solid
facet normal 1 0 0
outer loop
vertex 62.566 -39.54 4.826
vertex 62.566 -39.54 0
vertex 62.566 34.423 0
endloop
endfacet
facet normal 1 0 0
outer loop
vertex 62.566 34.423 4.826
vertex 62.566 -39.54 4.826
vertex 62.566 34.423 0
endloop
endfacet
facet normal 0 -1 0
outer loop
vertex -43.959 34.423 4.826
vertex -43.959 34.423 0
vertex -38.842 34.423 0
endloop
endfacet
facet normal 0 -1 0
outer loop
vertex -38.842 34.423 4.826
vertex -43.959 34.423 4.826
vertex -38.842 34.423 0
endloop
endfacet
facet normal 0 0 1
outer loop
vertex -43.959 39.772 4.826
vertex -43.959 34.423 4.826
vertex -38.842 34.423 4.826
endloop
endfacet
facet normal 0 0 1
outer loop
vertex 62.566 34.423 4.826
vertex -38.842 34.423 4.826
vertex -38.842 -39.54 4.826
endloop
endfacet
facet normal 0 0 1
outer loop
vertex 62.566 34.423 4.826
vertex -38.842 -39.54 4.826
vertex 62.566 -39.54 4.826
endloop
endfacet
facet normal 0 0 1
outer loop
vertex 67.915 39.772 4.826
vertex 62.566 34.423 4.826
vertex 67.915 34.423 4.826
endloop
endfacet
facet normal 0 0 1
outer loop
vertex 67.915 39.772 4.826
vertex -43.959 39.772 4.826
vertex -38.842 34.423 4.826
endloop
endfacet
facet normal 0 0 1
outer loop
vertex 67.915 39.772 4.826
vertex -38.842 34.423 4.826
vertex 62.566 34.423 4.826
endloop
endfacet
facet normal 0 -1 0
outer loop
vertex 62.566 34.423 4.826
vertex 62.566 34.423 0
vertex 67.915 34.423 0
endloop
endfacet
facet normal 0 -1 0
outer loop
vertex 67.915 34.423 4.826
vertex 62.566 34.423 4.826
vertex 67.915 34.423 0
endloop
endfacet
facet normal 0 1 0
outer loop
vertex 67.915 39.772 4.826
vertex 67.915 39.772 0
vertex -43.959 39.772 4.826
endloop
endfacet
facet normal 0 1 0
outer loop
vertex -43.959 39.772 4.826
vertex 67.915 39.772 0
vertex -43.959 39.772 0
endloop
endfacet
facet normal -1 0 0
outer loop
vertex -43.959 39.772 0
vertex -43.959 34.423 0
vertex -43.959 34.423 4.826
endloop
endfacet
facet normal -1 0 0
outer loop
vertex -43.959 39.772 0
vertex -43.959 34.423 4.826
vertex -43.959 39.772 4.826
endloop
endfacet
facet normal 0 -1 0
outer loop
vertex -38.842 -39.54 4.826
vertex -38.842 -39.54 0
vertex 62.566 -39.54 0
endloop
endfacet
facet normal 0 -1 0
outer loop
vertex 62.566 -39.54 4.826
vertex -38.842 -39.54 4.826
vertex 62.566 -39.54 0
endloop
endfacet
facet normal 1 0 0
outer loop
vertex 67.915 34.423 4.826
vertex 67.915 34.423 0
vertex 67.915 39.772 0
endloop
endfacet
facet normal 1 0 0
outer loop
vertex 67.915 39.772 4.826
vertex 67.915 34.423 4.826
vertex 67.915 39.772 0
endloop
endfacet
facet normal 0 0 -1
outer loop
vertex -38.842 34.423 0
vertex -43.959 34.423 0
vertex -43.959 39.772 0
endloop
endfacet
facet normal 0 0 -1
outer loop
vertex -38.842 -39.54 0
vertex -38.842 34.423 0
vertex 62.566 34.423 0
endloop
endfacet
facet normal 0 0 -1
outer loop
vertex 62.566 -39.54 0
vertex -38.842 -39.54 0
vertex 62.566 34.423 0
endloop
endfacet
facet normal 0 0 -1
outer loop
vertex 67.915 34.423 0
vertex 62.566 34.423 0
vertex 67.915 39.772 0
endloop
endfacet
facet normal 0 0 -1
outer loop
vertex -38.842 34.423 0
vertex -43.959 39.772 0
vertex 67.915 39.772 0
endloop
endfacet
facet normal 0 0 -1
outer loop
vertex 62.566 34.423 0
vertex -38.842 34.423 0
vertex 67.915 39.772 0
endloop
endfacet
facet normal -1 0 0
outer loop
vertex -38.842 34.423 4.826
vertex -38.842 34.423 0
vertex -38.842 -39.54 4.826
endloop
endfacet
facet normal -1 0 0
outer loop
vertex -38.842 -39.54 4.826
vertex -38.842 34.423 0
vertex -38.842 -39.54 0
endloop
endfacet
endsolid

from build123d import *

# Parameters (mm, degrees)
F0_W     = 5.116921
F0_H     = 5.349506
F0_W_2   = 5.349502
F1_DEPTH = 4.826


with BuildPart() as f1:
    # F0 (on Top) → F1 (new body)
    with BuildSketch(Plane.XY):
        Polygon((62.56596, 39.772414), (-38.842063, 39.772414), (-38.842063, 34.422908), (-38.842063, -39.539825), (62.56596, -39.539825), (62.56596, 34.422908), align=None)
        with Locations((-41.400523, 37.097661)):
            Rectangle(F0_W, F0_H)
        with Locations((65.240711, 37.097661)):
            Rectangle(F0_W_2, F0_H)
    extrude(amount=F1_DEPTH)


solid = f1.part
